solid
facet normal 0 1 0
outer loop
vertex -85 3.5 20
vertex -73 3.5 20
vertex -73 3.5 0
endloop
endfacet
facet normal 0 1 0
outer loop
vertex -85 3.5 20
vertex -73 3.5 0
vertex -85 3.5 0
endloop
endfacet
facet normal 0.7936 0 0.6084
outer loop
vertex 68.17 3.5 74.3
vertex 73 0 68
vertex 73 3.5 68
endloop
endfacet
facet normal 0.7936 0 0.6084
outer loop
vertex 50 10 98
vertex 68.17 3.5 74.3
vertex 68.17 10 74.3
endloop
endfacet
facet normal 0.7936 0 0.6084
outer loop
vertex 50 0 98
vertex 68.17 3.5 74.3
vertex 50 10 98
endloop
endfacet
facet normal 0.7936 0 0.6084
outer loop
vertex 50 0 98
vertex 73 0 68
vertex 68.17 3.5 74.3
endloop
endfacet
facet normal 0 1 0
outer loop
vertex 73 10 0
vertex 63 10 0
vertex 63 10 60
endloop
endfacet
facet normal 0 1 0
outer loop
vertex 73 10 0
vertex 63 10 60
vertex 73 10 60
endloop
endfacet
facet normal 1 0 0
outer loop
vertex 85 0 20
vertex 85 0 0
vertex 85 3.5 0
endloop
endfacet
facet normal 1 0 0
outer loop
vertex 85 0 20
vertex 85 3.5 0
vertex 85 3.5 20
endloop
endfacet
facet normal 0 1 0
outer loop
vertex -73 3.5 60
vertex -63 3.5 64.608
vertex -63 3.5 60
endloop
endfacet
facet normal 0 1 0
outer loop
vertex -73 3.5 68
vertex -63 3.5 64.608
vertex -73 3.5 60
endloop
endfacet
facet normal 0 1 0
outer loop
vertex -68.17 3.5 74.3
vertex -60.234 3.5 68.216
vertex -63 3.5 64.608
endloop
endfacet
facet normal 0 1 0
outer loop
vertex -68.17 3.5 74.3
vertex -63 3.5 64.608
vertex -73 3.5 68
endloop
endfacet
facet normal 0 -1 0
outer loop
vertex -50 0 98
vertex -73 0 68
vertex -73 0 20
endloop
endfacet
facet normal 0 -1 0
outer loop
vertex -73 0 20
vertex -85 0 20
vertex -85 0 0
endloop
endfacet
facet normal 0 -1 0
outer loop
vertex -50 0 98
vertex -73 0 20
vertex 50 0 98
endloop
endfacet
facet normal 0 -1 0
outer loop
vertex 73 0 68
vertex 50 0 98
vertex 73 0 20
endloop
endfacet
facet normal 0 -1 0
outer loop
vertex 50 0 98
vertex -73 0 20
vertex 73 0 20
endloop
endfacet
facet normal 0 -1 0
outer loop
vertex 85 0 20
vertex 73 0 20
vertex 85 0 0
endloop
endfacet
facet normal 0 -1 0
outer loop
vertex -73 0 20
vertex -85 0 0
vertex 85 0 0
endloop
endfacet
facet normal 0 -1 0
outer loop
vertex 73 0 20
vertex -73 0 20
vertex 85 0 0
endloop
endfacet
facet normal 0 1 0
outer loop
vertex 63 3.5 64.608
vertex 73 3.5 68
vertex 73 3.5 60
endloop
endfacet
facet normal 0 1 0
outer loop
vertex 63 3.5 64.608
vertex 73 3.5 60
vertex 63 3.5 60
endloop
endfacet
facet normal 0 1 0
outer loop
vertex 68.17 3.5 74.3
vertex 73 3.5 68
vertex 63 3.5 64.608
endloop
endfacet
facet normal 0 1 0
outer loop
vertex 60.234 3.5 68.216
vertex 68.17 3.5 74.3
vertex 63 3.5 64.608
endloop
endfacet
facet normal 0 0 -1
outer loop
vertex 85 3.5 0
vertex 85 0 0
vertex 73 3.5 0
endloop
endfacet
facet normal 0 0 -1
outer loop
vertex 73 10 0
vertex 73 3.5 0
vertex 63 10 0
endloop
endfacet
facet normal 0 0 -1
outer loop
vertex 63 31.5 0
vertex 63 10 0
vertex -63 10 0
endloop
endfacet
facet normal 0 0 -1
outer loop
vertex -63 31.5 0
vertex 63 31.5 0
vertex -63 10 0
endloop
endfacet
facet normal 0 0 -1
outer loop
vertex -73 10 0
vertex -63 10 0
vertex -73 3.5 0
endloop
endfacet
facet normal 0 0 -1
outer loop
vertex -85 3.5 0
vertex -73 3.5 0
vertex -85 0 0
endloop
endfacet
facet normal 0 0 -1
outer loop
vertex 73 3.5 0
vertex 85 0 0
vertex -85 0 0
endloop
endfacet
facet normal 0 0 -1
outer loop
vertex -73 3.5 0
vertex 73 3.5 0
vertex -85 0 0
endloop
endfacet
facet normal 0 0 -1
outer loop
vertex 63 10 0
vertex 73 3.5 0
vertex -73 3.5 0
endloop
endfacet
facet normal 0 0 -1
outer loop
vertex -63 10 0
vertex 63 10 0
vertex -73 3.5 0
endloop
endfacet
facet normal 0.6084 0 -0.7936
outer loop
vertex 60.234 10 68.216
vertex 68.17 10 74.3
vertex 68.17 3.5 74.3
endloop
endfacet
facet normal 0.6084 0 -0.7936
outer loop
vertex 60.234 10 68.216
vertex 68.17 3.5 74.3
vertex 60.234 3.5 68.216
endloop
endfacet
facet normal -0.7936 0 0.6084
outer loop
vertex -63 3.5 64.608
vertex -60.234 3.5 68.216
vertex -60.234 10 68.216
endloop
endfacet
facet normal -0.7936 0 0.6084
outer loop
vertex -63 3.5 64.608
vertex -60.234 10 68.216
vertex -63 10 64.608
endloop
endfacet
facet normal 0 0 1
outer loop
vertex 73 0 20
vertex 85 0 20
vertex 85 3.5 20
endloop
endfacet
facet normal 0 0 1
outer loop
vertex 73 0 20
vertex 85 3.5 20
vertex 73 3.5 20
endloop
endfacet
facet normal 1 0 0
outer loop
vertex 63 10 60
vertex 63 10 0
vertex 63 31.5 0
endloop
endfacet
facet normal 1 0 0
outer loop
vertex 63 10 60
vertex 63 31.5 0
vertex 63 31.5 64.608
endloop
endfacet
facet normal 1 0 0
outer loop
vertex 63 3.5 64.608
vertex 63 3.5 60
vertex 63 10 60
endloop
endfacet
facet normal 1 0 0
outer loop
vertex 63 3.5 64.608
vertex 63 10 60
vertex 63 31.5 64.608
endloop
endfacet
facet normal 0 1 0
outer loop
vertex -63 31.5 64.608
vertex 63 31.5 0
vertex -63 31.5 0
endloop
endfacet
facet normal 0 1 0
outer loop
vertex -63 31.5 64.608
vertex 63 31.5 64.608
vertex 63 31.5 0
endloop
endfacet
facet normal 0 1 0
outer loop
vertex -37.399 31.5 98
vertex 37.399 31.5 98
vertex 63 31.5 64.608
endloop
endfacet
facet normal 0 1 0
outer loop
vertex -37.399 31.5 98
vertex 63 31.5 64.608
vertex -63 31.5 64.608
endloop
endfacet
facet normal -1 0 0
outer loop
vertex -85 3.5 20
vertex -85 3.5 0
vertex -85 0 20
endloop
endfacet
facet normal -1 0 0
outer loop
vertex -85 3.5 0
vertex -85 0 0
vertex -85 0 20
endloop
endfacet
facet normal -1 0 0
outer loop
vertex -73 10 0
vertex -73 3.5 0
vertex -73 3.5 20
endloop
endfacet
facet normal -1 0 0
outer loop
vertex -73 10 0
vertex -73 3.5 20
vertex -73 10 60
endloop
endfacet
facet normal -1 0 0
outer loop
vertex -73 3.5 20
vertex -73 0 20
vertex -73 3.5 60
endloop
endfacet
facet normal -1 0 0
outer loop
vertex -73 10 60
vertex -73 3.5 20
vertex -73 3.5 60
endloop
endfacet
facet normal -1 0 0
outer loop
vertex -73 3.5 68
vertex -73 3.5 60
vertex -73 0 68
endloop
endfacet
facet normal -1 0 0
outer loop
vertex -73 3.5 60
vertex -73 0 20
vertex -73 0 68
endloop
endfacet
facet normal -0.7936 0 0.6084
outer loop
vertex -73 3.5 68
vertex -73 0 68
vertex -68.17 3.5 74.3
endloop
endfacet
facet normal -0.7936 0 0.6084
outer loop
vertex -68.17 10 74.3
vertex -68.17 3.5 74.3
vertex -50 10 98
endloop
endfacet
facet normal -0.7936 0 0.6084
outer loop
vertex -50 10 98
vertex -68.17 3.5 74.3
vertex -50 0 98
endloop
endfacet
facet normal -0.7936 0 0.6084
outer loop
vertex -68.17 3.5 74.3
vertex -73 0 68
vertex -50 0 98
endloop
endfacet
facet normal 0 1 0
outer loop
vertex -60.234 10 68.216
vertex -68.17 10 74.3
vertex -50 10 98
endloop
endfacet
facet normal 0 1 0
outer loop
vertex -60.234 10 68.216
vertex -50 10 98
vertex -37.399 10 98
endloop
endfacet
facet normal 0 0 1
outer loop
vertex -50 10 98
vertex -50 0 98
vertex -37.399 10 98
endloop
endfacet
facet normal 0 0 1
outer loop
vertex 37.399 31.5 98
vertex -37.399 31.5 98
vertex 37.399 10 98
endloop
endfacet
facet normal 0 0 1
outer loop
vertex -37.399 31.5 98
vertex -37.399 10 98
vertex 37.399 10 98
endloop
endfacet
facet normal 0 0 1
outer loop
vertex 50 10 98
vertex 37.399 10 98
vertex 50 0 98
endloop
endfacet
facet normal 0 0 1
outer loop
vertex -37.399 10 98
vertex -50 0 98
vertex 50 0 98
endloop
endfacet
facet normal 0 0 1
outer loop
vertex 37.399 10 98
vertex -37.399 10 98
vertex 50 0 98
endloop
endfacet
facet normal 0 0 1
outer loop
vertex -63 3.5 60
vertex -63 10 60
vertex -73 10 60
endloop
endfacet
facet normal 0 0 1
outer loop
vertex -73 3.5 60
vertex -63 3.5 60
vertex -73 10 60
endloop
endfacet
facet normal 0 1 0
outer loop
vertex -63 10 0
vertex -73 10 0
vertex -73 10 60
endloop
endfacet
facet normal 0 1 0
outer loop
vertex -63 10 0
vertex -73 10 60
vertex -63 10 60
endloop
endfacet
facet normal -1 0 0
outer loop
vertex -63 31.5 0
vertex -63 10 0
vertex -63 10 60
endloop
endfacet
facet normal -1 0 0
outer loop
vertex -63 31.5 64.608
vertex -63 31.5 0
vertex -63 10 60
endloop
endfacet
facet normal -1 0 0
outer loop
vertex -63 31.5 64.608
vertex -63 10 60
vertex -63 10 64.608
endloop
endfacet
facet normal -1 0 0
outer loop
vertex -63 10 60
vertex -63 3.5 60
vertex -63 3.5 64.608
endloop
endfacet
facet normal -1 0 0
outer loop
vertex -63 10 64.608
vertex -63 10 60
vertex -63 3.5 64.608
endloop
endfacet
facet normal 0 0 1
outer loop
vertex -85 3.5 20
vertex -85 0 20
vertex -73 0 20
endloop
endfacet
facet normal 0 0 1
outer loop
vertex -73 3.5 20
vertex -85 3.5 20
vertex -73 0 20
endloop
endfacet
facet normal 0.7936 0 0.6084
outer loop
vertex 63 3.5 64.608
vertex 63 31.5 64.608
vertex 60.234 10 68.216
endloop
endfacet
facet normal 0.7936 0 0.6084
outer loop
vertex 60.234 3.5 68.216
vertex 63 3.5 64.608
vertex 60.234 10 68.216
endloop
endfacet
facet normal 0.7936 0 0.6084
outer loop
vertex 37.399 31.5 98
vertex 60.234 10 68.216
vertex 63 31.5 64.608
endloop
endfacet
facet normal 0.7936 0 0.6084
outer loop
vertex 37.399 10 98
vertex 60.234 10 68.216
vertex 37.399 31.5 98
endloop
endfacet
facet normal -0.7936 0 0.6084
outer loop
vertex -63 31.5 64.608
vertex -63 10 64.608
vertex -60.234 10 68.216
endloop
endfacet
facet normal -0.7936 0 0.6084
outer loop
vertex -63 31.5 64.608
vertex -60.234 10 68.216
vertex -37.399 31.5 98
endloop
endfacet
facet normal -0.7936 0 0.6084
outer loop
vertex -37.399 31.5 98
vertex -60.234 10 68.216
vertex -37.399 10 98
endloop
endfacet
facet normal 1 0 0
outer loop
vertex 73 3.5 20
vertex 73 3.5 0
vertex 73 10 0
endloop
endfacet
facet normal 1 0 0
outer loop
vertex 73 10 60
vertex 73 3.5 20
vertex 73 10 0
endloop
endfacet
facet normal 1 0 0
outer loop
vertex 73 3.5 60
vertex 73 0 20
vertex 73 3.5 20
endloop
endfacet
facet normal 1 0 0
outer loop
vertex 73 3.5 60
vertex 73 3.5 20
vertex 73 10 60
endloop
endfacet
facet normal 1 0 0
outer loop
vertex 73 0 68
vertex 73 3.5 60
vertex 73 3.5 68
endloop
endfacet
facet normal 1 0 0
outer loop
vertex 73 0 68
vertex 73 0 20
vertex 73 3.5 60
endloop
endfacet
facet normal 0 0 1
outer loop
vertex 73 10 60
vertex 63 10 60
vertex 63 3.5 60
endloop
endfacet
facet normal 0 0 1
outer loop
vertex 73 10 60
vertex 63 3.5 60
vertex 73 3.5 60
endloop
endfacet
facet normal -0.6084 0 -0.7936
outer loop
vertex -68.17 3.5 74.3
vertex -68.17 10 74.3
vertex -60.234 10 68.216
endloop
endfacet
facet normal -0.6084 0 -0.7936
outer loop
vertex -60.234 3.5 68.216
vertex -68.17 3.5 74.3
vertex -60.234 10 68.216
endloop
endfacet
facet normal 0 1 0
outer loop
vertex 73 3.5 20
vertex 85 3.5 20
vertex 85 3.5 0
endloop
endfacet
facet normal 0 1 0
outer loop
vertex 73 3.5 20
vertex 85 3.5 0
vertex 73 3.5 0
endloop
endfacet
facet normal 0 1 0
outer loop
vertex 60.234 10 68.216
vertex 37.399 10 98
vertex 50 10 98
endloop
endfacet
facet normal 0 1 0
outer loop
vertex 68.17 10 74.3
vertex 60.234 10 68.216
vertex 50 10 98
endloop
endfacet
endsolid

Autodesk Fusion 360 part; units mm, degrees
sketch "Sketch1" plane through (0, 0, 0) normal (0, 1, 0) x (1, 0, 0)
  line L0 (0, 0) -> (-85, 0)
  line L1 (0, 0) -> (0, -98)
  line L2 (-85, 0) -> (-85, -20)
  line L3 (-85, -20) -> (-73, -20)
  line L4 (-73, -20) -> (-73, -68)
  line L5 (-73, -68) -> (-50, -98)
  line L6 (-50, -98) -> (0, -98)
  line L7 (50, -98) -> (0, -98)
  line L8 (73, -68) -> (50, -98)
  line L9 (73, -20) -> (73, -68)
  line L10 (85, -20) -> (73, -20)
  line L11 (85, 0) -> (85, -20)
  line L12 (0, 0) -> (85, 0)
  dimension "d1" = 85
  dimension "d2" = 20
  dimension "d3" = 12
  dimension "d4" = 48
  dimension "d5" = 98
  dimension "d6" = 50
extrude "Extrude1" add sketch "Sketch1" along normal blind 10
sketch "Sketch2" plane through (0, 10, 0) normal (0, 1, 0) x (-1, 0, 0)
  line L0 (85, 0) -> (85, 20)
  line L1 (85, 20) -> (73, 20)
  line L2 (73, 20) -> (73, 68)
  line L3 (73, 68) -> (50, 98)
  line L4 (50, 98) -> (-50, 98)
  line L5 (-50, 98) -> (-73, 68)
  line L6 (-73, 68) -> (-73, 20)
  line L7 (-73, 20) -> (-85, 20)
  line L8 (-85, 20) -> (-85, 0)
  line L9 (-85, 0) -> (85, 0)
  line L10 (-63, 0) -> (-63, 64.6078)
  line L11 (-63, 64.6078) -> (-37.3993, 98)
  line L12 (0, 98) -> (0, 0)
  line L13 (63, 64.6078) -> (37.3993, 98)
  line L14 (63, 0) -> (63, 64.6078)
  dimension "d9" = 10
  dimension "d10" = 10
extrude "Extrude2" add sketch "Sketch2" along normal blind 21.5 contours L4 L9 L12 L13 L14 | L4 L9 L10 L11 L12
sketch "Sketch3" plane through (0, 10, 0) normal (0, 1, 0) x (-1, 0, 0)
  line L0 (-63, 64.6078) -> (-37.3993, 98)
  line L1 (-37.3993, 98) -> (-50, 98)
  line L2 (-50, 98) -> (-73, 68)
  line L3 (-73, 68) -> (-73, 20)
  line L4 (-73, 20) -> (-85, 20)
  line L5 (-85, 20) -> (-85, 0)
  line L6 (-85, 0) -> (-63, 0)
  line L7 (-63, 0) -> (-63, 64.6078)
  line L8 (-73, 20) -> (-85, 20)
  line L9 (-85, 20) -> (-85, 0)
  line L10 (-85, 0) -> (-73, 0)
  line L11 (-73, 0) -> (-73, 20)
  line L12 (0, 0) -> (0, 105.5931)
  line L13 (73, 20) -> (85, 20)
  line L14 (73, 0) -> (73, 20)
  line L15 (85, 20) -> (85, 0)
  line L16 (85, 0) -> (73, 0)
  line L17 (-68.17, 74.3) -> (-60.2339, 68.2157)
  line L18 (-60.2339, 68.2157) -> (-63, 64.6078)
  line L19 (-63, 60) -> (-73, 60)
  line L20 (-73, 68) -> (-68.17, 74.3)
  line L21 (-73, 68) -> (-73, 60)
  line L22 (-63, 60) -> (-63, 64.6078)
  line L23 (63, 60) -> (73, 60)
  line L24 (63, 60) -> (63, 64.6078)
  line L25 (60.2339, 68.2157) -> (63, 64.6078)
  line L26 (68.17, 74.3) -> (60.2339, 68.2157)
  line L27 (73, 68) -> (68.17, 74.3)
  line L28 (73, 68) -> (73, 60)
  dimension "d15" = 8
  dimension "d20" = 6.3
extrude "Extrude3" cut sketch "Sketch3" against normal blind 6.5 contours L0 L2 L3 L7 L17 L18 L19 L20 L21 L22 | L4 L5 L6 L8 L9 L10 L11 | L13 L14 L15 L16 | L23 L24 L25 L26 L27 L28
equation "d1 = ( 170 / 2 ) * 1 mm"
equation "d10 = d9"
